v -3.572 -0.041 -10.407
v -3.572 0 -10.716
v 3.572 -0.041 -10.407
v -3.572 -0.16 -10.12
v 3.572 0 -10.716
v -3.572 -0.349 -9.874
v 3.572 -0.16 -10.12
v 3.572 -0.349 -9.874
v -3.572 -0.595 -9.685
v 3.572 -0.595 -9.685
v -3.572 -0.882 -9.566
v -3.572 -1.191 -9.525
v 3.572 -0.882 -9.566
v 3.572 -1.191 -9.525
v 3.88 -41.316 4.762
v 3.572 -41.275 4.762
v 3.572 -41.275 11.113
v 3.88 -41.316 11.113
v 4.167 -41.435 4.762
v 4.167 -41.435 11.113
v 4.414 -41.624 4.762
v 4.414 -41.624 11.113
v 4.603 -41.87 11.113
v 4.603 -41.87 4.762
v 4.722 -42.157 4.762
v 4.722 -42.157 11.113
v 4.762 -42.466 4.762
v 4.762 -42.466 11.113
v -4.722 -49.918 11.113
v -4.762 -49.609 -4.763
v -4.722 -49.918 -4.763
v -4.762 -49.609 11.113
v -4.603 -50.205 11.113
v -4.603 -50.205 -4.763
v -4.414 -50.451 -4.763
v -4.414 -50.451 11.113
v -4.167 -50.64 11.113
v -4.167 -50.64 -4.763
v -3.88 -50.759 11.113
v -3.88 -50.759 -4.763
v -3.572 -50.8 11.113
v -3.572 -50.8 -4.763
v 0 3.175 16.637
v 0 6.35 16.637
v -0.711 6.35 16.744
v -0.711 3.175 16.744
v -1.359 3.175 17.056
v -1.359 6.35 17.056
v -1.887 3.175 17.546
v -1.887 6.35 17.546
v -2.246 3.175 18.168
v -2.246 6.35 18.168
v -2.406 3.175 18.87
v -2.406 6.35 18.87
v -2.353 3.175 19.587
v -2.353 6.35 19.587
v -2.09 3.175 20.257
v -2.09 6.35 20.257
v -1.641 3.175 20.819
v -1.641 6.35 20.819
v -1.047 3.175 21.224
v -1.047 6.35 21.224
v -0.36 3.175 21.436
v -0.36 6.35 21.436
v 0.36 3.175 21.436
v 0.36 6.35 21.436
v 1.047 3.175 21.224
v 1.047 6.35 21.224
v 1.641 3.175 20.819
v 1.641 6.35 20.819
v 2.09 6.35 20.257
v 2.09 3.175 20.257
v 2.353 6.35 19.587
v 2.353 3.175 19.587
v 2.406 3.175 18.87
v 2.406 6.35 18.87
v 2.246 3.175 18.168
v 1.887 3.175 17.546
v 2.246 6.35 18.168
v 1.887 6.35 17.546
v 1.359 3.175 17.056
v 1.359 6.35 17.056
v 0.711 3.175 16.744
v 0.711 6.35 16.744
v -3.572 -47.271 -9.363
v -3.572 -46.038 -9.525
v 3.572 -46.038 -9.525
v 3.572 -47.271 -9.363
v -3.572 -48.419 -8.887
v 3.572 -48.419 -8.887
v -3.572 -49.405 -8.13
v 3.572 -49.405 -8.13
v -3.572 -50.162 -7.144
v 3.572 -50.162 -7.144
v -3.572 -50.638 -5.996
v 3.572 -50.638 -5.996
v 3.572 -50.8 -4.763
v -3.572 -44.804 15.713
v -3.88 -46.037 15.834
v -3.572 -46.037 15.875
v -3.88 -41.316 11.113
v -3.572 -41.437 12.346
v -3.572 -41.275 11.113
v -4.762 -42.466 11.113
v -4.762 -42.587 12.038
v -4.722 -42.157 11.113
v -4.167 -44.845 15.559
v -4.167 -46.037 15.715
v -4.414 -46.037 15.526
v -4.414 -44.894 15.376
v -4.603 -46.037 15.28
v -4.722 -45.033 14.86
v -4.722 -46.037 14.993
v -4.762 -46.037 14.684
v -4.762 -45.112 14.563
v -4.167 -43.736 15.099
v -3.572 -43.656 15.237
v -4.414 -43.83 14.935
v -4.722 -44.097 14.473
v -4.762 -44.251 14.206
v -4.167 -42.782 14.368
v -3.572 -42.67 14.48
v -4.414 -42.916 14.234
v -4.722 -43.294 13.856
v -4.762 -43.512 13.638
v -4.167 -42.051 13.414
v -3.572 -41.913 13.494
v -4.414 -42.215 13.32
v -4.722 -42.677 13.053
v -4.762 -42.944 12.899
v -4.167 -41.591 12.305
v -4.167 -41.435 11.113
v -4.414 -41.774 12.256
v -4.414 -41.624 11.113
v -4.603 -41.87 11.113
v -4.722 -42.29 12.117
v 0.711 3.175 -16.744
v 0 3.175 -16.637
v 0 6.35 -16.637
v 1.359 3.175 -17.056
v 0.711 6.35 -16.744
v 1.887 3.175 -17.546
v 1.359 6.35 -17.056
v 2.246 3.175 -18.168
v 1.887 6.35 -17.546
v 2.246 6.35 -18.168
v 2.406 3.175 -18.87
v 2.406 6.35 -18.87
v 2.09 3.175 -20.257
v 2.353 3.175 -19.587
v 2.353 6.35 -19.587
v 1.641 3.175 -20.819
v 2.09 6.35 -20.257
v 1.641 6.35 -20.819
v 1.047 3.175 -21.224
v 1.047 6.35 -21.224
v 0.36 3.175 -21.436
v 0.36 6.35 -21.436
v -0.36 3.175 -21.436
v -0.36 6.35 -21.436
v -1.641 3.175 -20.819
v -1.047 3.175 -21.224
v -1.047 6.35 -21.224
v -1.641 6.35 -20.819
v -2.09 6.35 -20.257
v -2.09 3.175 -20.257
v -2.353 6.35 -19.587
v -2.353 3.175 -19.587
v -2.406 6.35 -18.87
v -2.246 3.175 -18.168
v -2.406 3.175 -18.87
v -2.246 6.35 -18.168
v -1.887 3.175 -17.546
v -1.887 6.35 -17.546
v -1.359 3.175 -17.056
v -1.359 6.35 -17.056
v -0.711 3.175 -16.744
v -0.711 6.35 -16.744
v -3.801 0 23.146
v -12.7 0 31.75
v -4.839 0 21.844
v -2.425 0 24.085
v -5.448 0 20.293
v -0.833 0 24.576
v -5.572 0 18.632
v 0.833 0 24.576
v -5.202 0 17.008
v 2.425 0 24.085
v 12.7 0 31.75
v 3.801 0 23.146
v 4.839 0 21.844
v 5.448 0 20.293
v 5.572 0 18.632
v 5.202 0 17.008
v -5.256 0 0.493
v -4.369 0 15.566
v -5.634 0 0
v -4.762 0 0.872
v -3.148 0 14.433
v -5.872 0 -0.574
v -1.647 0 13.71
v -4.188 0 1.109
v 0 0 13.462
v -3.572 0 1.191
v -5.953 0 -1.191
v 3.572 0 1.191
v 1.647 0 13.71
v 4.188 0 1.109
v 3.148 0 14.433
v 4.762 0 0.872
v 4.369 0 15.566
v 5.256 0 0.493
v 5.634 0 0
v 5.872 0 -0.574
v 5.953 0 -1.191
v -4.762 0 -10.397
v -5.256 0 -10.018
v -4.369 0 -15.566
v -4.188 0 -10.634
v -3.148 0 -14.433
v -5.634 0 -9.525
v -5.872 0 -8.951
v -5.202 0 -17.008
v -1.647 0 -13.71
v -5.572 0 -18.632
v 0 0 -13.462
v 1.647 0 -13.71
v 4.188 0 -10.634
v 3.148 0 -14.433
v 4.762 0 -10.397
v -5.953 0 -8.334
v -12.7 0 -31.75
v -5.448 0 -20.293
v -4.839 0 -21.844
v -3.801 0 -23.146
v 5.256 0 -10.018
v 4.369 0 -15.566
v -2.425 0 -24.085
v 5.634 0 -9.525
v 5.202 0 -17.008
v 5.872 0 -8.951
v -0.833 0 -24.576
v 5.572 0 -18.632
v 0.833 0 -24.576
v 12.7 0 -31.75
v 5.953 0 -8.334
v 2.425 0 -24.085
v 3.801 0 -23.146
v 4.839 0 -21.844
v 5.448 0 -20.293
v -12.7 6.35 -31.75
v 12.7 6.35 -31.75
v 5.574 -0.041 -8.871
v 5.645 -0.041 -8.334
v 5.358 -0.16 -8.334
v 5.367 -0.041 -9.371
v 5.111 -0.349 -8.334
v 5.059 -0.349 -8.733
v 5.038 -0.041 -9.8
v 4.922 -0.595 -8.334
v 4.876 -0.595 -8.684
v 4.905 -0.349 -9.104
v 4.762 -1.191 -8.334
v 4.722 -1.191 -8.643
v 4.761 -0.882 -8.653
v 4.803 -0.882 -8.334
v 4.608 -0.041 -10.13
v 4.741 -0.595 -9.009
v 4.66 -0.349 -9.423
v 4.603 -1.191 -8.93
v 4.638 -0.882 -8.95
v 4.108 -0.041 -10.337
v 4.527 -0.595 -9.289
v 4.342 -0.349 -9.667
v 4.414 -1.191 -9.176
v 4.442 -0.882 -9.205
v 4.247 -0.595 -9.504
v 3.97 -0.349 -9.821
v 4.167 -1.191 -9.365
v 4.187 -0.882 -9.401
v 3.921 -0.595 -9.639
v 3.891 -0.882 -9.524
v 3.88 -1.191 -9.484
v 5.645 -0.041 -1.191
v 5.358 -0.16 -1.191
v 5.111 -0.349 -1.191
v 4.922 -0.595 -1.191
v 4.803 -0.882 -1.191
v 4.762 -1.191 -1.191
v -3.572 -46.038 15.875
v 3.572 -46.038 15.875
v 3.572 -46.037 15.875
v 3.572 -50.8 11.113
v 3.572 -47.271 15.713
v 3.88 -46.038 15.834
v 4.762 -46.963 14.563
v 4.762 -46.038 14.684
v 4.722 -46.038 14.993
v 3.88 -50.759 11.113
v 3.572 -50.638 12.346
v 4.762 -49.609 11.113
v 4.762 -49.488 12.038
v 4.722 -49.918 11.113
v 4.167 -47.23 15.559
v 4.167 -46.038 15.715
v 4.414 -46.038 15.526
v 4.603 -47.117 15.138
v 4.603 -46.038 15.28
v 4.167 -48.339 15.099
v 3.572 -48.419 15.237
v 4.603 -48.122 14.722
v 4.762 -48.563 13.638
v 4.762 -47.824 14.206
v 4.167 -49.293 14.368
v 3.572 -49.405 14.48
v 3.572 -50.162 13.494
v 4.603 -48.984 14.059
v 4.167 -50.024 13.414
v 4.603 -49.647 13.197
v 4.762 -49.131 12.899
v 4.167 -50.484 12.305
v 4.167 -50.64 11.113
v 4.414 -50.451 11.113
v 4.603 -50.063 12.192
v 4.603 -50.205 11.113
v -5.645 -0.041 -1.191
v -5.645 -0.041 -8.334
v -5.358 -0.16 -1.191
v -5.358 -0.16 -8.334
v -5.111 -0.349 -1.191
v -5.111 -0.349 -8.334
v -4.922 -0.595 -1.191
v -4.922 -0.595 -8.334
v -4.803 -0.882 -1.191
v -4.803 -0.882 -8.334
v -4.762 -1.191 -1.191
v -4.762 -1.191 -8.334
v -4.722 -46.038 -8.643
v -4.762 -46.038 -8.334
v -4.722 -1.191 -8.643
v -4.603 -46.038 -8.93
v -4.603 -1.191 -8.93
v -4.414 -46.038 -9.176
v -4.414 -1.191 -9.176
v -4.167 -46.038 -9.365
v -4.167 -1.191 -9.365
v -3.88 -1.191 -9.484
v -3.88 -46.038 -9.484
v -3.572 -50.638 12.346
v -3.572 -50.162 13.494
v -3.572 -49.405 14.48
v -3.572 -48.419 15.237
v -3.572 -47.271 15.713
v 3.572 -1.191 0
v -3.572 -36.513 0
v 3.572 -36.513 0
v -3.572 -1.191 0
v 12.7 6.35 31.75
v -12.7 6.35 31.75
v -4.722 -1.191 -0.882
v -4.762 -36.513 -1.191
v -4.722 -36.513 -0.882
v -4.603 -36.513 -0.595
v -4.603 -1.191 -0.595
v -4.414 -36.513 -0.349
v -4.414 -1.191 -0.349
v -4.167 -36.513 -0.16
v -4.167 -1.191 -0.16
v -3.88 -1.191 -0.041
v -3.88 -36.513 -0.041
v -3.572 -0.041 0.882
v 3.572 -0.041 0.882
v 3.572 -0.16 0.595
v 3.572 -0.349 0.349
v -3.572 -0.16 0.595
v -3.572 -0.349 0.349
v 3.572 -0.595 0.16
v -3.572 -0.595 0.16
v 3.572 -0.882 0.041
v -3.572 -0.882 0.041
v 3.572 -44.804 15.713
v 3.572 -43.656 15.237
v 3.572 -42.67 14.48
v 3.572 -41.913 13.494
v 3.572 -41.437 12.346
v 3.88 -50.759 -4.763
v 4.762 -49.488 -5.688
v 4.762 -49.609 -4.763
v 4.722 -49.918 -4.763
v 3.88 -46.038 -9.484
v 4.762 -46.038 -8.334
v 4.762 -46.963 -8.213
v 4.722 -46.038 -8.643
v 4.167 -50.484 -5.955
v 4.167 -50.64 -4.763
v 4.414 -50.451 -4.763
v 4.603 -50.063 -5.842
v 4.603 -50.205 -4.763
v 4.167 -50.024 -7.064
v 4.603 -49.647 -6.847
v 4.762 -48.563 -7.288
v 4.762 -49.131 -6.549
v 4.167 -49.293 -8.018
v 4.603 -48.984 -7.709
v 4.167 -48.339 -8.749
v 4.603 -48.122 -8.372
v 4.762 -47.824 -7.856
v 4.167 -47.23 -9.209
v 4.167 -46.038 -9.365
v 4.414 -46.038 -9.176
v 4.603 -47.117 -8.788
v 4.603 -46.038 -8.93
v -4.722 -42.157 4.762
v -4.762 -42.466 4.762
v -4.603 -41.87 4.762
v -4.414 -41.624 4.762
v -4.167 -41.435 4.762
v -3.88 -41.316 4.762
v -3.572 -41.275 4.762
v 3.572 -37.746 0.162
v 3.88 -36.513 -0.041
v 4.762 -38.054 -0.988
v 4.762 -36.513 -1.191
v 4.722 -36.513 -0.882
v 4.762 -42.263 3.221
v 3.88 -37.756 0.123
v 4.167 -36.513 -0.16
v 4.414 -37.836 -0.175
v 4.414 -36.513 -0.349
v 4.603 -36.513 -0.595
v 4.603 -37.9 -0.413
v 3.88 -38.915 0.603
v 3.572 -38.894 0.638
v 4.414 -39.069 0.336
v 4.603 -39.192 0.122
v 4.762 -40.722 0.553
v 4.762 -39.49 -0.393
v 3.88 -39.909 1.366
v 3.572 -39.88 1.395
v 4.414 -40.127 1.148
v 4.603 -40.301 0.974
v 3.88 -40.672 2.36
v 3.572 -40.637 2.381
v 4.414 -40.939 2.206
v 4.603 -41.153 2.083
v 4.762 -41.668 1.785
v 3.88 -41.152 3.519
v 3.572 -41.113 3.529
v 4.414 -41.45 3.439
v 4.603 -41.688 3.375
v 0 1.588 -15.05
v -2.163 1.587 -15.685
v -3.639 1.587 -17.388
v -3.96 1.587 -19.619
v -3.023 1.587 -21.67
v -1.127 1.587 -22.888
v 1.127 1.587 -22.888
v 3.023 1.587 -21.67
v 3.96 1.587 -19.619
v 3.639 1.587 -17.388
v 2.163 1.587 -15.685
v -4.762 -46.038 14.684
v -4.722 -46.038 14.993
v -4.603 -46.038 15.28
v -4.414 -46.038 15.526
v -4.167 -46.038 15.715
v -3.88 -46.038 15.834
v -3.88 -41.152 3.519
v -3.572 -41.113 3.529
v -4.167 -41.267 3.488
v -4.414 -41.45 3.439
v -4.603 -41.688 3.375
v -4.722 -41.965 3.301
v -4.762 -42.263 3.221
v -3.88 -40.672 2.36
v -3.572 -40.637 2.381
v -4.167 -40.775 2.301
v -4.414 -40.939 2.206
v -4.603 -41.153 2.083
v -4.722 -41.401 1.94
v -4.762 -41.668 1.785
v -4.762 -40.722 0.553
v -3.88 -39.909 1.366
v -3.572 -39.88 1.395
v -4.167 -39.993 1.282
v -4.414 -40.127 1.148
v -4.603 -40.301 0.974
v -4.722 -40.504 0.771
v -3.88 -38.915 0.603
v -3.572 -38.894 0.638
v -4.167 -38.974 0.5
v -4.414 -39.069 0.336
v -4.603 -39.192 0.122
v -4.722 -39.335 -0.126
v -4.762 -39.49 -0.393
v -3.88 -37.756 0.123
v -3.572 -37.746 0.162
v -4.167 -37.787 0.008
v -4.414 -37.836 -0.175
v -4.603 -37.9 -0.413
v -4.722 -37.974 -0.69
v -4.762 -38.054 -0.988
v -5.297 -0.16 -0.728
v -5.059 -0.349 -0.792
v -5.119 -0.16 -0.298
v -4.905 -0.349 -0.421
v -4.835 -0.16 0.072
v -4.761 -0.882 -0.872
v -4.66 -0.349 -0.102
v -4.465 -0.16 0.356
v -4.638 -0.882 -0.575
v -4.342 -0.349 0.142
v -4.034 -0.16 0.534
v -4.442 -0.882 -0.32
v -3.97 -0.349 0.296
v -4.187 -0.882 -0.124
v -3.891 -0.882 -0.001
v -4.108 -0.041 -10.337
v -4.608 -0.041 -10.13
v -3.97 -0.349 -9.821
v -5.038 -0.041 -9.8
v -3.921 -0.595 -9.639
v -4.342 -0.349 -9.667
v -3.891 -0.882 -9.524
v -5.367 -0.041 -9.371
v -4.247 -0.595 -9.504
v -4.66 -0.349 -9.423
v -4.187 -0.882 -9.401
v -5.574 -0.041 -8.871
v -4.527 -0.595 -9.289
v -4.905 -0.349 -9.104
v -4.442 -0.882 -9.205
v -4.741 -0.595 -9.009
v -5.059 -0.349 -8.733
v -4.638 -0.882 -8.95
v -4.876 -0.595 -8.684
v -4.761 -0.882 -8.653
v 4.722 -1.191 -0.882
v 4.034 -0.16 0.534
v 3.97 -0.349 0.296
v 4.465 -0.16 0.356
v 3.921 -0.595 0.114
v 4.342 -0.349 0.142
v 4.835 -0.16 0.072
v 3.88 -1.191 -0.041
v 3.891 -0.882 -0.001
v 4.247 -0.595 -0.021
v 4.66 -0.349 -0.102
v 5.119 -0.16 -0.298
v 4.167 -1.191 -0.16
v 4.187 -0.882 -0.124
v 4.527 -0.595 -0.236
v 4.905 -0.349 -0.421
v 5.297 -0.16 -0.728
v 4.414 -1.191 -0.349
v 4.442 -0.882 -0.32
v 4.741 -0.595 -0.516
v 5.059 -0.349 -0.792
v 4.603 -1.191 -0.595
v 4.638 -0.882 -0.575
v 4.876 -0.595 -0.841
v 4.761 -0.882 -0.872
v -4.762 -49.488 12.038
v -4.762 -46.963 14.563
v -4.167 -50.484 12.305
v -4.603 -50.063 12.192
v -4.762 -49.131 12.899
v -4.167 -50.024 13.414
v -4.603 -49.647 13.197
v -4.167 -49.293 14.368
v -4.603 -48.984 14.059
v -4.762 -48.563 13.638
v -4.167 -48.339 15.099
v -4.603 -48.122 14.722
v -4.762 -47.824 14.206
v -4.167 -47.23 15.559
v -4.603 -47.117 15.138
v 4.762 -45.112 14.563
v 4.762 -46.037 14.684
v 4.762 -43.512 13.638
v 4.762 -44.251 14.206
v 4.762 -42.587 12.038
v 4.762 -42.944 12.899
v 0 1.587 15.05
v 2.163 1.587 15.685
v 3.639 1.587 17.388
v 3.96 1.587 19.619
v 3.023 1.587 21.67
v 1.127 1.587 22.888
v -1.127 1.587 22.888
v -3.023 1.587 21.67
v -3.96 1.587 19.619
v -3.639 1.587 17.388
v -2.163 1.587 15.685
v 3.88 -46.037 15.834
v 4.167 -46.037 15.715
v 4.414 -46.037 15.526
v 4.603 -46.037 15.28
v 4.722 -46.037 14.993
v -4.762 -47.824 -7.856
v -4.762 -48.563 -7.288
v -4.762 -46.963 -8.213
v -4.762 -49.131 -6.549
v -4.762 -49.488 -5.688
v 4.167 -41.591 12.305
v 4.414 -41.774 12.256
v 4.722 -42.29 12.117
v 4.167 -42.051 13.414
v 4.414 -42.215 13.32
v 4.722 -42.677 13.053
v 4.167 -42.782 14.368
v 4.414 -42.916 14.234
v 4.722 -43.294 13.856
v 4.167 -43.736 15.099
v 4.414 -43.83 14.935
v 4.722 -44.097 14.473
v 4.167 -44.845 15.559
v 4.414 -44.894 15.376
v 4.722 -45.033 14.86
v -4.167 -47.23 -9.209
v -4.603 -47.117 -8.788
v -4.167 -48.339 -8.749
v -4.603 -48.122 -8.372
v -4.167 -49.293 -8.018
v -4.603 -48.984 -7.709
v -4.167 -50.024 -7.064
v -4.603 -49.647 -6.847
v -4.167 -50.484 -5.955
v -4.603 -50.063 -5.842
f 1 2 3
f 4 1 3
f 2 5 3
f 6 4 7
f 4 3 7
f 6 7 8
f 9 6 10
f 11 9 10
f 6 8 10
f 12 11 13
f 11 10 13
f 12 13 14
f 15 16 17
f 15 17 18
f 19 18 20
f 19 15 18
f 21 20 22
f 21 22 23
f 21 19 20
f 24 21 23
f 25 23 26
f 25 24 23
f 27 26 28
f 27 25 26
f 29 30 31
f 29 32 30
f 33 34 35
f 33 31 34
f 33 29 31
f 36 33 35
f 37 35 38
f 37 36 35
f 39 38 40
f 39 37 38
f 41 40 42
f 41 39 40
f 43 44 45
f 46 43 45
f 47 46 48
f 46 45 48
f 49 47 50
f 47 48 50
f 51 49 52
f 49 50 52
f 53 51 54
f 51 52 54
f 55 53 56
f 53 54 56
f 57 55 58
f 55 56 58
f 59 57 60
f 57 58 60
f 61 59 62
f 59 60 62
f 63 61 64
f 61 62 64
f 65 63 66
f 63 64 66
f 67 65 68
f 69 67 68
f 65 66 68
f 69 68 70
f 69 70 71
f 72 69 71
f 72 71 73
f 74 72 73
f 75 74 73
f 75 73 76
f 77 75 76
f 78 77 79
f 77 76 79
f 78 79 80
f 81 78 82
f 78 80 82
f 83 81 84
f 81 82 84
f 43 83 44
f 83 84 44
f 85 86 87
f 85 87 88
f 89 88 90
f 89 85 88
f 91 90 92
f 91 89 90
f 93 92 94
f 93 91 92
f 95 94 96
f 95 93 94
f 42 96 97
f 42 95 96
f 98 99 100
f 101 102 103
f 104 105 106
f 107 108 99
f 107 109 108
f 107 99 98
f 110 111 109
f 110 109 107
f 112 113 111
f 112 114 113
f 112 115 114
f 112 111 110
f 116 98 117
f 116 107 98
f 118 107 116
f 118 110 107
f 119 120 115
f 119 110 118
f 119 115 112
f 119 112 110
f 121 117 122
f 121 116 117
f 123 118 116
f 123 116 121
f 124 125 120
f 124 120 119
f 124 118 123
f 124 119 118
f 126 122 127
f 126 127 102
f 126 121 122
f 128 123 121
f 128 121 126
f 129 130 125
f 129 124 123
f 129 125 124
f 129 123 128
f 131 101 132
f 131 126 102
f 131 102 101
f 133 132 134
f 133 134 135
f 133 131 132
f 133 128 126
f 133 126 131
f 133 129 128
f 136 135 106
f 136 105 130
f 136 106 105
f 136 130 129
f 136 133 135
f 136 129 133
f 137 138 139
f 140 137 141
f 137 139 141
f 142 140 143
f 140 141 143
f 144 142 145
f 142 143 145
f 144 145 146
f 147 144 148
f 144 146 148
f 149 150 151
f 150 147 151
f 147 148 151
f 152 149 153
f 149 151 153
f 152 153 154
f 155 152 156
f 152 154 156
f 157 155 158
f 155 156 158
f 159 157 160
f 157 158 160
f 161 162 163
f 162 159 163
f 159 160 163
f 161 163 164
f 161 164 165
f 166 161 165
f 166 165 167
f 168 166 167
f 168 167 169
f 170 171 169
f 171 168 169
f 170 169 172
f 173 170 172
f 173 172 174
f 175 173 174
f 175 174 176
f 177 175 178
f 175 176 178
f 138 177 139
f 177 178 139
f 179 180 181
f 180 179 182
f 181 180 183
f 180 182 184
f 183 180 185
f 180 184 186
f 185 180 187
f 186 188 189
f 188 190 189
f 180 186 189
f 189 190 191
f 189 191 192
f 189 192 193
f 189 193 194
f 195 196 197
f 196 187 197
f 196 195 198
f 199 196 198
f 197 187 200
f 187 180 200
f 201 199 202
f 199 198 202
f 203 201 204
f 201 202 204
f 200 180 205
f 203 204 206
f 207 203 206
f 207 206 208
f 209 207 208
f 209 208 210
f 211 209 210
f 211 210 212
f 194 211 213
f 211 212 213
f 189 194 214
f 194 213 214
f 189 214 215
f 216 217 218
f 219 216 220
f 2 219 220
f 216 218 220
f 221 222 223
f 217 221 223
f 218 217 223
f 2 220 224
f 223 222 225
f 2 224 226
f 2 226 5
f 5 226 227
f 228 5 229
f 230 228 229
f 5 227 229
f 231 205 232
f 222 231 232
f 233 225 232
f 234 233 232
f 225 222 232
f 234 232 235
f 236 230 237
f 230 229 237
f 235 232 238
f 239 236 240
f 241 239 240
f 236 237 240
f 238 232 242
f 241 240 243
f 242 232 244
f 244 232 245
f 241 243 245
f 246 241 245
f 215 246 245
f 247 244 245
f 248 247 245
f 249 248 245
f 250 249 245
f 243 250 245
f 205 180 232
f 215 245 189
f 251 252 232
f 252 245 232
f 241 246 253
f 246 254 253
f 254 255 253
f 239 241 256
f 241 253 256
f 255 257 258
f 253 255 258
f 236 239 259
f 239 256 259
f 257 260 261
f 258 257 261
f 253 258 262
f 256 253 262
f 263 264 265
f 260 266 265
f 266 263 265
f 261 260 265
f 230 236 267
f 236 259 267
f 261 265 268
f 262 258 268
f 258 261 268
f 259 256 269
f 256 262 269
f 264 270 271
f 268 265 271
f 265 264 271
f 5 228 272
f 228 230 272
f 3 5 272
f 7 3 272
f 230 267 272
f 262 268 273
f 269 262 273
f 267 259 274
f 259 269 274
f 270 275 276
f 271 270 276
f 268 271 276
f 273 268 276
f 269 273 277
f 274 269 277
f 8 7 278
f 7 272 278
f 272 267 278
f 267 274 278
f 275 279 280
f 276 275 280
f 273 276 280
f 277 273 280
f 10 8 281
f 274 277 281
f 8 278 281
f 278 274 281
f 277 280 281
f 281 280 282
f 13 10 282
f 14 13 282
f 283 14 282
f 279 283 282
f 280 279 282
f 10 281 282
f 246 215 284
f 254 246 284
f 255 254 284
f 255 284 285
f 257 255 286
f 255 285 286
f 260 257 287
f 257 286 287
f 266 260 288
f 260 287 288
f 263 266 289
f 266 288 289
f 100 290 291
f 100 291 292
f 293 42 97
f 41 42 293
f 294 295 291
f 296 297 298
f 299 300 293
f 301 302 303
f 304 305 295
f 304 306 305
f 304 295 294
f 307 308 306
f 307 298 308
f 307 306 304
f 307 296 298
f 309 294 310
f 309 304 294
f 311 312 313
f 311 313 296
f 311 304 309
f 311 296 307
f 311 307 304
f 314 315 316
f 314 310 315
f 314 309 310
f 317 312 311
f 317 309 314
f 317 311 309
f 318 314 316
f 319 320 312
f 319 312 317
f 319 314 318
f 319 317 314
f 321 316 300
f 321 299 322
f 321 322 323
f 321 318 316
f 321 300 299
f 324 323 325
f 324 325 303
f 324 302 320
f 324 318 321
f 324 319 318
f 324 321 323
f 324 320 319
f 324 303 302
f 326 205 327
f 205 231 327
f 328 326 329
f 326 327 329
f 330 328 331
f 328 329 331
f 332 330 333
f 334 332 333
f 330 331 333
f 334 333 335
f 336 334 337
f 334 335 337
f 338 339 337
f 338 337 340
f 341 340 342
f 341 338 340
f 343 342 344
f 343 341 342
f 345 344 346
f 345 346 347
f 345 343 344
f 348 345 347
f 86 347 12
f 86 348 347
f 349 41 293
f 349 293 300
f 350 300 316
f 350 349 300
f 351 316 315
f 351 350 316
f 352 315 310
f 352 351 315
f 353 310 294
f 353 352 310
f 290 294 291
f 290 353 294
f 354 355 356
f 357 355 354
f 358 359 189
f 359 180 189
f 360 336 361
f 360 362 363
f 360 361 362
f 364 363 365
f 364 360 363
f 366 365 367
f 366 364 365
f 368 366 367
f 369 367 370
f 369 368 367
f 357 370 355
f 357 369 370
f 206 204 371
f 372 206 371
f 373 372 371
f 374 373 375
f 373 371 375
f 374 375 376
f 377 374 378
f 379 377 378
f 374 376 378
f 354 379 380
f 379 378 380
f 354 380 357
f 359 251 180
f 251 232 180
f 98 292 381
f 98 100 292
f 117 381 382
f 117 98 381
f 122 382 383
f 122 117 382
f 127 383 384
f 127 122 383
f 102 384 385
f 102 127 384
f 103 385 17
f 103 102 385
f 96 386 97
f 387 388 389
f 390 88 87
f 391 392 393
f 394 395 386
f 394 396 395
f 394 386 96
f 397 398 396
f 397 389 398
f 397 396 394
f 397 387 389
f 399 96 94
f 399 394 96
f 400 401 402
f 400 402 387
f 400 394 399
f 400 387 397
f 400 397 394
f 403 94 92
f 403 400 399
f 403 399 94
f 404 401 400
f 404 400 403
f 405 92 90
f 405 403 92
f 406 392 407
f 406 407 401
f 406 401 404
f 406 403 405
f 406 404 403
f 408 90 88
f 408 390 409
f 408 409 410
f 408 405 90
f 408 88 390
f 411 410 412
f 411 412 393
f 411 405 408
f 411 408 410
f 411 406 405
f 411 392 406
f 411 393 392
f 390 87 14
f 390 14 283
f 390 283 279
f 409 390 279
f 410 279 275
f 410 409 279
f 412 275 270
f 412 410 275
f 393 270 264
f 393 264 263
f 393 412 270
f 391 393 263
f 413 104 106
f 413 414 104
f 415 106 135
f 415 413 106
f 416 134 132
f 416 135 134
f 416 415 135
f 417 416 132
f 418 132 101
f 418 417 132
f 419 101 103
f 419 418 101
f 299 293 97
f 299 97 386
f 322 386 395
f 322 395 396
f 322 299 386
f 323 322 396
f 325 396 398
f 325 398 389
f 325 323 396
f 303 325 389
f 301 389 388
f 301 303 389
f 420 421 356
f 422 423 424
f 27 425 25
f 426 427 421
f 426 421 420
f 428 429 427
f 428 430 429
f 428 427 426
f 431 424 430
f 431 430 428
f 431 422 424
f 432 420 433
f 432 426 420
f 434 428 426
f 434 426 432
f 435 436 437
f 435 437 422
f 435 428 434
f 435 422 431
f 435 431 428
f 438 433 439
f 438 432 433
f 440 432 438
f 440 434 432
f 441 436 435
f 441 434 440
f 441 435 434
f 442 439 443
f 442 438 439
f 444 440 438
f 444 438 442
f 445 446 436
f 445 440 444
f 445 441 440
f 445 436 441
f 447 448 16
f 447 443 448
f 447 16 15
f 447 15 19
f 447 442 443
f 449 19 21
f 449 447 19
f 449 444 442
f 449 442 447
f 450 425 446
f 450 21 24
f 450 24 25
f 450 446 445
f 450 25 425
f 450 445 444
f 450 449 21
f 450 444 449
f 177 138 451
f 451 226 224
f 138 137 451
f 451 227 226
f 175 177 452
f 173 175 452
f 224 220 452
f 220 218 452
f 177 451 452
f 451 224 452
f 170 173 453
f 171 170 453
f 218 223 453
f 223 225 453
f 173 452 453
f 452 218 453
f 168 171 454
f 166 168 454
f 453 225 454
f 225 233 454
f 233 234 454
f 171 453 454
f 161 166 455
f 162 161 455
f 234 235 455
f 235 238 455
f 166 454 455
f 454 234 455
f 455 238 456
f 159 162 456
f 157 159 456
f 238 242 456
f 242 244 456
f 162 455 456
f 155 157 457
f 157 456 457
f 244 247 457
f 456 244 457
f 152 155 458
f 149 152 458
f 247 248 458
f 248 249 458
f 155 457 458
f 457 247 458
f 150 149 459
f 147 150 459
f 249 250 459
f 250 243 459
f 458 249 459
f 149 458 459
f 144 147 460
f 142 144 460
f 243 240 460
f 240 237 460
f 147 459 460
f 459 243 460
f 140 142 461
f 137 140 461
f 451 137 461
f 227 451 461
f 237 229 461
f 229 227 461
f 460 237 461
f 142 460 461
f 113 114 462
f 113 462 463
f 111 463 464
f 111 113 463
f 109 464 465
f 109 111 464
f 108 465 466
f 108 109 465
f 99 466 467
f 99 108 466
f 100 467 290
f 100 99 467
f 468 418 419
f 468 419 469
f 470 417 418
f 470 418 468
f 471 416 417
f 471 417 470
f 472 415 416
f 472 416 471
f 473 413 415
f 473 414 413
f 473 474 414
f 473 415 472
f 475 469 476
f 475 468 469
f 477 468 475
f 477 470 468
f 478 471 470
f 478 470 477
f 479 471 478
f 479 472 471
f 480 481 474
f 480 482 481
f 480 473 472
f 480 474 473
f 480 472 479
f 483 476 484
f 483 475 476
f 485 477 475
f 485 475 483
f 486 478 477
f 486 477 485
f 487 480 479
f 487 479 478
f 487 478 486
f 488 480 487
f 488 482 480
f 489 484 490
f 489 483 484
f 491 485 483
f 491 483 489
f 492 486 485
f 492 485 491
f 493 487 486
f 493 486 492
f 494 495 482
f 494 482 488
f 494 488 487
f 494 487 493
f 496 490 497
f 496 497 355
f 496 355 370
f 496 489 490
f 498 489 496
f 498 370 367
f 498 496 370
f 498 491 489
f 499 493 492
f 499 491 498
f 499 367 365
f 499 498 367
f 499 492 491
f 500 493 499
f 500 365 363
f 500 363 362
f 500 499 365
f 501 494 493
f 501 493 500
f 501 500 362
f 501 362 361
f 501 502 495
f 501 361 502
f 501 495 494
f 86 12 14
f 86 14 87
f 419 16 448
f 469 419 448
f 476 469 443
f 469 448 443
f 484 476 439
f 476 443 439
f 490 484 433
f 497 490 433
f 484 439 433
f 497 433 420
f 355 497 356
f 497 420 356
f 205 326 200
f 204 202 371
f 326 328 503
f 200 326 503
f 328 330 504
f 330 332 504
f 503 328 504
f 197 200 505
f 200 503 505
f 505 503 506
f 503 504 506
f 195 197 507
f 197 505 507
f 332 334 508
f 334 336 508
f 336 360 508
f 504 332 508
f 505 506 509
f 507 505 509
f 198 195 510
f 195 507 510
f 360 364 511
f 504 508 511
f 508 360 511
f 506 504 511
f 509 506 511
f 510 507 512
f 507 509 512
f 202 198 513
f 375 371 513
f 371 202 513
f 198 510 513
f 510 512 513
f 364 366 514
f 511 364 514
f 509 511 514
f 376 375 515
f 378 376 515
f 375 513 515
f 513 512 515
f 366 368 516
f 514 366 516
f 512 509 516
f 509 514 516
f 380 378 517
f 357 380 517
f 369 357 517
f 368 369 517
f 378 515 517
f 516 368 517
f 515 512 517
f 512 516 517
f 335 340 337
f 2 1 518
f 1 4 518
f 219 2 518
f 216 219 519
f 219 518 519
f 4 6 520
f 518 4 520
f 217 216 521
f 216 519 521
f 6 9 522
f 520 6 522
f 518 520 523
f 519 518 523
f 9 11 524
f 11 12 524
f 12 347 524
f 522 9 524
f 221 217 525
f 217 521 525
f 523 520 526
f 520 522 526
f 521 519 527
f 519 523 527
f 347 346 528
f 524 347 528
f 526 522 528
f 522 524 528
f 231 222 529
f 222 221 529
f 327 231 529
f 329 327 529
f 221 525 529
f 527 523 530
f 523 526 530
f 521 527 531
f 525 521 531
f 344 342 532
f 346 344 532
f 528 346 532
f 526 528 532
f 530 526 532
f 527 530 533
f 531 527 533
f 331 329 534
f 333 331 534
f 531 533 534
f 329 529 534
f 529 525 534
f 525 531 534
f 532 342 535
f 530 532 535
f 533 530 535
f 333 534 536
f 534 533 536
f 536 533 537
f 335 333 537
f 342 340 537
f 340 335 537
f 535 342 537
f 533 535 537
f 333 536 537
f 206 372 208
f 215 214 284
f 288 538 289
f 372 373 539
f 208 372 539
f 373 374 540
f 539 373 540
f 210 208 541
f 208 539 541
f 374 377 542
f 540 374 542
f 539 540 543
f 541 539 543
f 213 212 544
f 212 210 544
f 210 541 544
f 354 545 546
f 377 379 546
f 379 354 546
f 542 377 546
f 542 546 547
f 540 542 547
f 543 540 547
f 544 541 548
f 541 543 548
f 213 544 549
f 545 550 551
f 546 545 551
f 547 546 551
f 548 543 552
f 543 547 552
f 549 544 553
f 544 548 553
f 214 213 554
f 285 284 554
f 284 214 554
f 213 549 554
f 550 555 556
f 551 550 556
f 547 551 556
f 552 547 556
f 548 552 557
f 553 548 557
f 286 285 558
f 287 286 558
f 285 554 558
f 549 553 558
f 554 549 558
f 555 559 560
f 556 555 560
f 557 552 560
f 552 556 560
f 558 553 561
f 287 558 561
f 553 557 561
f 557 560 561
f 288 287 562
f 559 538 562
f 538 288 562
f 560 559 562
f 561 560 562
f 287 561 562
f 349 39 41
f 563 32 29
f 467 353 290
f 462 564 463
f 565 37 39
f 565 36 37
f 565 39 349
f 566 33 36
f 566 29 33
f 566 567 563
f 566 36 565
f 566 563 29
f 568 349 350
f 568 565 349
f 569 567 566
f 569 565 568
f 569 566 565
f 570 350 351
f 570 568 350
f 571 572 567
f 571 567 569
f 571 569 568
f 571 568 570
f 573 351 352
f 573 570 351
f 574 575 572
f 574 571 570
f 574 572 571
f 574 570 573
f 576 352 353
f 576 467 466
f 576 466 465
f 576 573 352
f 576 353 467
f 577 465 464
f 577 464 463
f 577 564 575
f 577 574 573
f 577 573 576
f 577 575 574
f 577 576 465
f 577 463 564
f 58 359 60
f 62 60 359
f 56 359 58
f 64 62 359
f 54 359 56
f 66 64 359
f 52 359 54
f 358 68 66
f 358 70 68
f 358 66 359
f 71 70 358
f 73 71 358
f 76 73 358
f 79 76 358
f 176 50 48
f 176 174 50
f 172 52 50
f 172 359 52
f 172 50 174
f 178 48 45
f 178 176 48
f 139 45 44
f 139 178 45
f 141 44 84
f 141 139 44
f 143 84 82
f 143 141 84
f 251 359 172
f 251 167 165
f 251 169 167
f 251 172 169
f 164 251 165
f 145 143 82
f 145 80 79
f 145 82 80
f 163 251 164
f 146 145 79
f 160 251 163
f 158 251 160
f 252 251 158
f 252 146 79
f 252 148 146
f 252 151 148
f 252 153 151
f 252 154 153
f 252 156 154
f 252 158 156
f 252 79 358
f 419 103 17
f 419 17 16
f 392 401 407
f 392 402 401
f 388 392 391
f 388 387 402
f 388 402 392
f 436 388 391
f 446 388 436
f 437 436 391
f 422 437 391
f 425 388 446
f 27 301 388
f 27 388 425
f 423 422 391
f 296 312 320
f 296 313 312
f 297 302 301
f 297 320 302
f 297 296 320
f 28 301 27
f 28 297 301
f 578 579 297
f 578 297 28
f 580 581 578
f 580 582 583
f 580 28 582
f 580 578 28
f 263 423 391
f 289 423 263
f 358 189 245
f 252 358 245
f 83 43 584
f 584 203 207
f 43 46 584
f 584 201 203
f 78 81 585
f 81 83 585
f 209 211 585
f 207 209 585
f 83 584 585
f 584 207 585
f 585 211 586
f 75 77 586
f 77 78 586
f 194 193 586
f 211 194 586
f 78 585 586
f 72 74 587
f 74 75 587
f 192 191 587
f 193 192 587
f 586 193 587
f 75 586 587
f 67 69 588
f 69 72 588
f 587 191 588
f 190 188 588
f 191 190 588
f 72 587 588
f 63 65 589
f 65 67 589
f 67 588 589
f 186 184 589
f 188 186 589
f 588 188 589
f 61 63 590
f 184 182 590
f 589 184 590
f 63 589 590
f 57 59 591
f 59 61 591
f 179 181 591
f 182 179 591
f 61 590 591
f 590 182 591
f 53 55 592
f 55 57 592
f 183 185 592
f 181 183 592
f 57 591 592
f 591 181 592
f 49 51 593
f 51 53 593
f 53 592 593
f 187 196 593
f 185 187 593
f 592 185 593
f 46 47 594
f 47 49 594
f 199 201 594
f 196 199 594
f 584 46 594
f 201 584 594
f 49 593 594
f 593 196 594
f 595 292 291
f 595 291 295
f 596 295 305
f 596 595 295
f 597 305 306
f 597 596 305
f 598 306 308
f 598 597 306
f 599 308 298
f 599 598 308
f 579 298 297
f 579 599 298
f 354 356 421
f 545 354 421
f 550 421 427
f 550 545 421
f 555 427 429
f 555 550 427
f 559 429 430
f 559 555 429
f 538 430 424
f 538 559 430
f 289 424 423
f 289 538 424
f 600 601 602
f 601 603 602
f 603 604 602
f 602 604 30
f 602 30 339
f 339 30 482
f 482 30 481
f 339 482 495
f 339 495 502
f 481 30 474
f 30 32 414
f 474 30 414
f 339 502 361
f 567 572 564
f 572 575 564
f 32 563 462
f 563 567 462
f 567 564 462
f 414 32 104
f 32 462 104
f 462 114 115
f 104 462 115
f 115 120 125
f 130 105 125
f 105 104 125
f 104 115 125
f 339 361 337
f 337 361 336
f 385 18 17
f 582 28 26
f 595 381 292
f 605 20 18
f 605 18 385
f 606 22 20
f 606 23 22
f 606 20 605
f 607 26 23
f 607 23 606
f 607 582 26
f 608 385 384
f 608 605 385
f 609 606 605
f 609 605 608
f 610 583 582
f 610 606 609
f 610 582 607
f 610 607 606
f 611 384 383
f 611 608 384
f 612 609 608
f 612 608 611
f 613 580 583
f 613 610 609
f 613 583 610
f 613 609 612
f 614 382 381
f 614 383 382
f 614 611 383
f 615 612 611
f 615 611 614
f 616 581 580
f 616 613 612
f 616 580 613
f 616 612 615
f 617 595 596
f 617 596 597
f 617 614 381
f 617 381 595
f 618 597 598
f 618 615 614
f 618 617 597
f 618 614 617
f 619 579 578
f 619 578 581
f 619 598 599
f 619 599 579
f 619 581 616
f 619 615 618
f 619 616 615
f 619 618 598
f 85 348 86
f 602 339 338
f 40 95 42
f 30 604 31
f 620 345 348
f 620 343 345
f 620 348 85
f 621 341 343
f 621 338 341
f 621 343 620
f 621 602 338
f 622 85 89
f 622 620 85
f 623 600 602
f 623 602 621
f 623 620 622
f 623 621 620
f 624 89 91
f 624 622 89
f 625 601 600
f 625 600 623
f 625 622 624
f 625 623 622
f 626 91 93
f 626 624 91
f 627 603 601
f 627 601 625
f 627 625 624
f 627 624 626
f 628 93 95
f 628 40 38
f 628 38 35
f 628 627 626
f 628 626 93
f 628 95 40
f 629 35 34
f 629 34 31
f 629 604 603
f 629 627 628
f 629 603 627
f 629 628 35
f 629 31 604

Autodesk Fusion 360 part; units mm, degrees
sketch "Sketch1" plane through (0, 0, 0) normal (0, 1, 0) x (1, 0, 0) in component "Component"
  line L0 (12.7, 31.75) -> (-12.7, 31.75)
  line L1 (-12.7, 31.75) -> (-12.7, -31.75)
  line L2 (-12.7, -31.75) -> (12.7, -31.75)
  line L3 (12.7, -31.75) -> (12.7, 31.75)
  line L4 (12.7, 31.75) -> (-12.7, -31.75) construction
  line L5 (-12.7, 31.75) -> (12.7, -31.75) construction
  dimension "d1" = 63.5
  dimension "d2" = 25.4
extrude "Extrude1" add sketch "Sketch1" along normal blind 6.35 in component "Component"
hole "Hole1" at (0, 0, 19.05) direction (0, 1, 0) diameter 4.826 end through all in component "Component"
mirror "Mirror1" about plane through (0, 0, 0) normal (0, 0, 1) of "Hole1" in component "Component"
sketch "Sketch2" plane through (0, 0, 0) normal (1, 0, 0) x (0, 1, 0) in component "Component"
  line L0 (0, -9.525) -> (-50.8, -9.525)
  line L1 (-50.8, -9.525) -> (-50.8, 15.875)
  line L2 (-50.8, 15.875) -> (-41.275, 15.875)
  line L3 (-41.275, 15.875) -> (-41.275, 0)
  line L4 (-41.275, 0) -> (0, 0)
  line L5 (0, 0) -> (0, -9.525)
  line L6 (0, 0) -> (-81.1043, 0) construction
  dimension "d11" = 9.525
  dimension "d12" = 9.525
  dimension "d13" = 50.8
  dimension "d14" = 25.4
extrude "Extrude2" add sketch "Sketch2" along normal mid plane 9.525 in component "Component"
fillet "Fillet1" radius 4.7625 4 edges at (0, -50.8, -9.525) (0, -41.275, 0) (0, -50.8, 15.875) (0, -41.275, 15.875) in component "Component"
fillet "Fillet2" radius 1.1906 14 edges at (4.7625, -18.2563, 0) (4.7625, -39.8801, 1.3949) (4.7625, -41.275, 7.9375) (4.7625, -46.0375, 15.875) (4.7625, -50.8, 3.175) (4.7625, -49.4051, -8.1301) (4.7625, -23.0187, -9.525) (-4.7625, -23.0187, -9.525) (-4.7625, -49.4051, -8.1301) (-4.7625, -50.8, 3.175) (-4.7625, -46.0375, 15.875) (-4.7625, -41.275, 7.9375) (-4.7625, -39.8801, 1.3949) (-4.7625, -18.2563, 0) in component "Component"
fillet "Fillet2" radius 1.1906 2 edges at (-4.7625, 0, -4.7625) (4.7625, 0, -4.7625) in component "Component"
chamfer "Chamfer1" distance 3.175 angle 45 2 edges at (0.8726, 0, 21.2997) (-0.8726, 0, -21.2997) in component "Component"
component "Component" placed x (1, 0, 0) y (0, 1, 0) z (0, 0, 1) at (0, 0, 0)
equation "d11 = ( 3 / 8 ) * 1 in"
equation "d15 = ( 3 / 8 ) * 1 in"
equation "d17 = ( 3 / 16 ) * 1 in"
equation "d18 = ( 3 / 64 ) * 1 in"
equation "d19 = ( 3 / 64 ) * 1 in"
